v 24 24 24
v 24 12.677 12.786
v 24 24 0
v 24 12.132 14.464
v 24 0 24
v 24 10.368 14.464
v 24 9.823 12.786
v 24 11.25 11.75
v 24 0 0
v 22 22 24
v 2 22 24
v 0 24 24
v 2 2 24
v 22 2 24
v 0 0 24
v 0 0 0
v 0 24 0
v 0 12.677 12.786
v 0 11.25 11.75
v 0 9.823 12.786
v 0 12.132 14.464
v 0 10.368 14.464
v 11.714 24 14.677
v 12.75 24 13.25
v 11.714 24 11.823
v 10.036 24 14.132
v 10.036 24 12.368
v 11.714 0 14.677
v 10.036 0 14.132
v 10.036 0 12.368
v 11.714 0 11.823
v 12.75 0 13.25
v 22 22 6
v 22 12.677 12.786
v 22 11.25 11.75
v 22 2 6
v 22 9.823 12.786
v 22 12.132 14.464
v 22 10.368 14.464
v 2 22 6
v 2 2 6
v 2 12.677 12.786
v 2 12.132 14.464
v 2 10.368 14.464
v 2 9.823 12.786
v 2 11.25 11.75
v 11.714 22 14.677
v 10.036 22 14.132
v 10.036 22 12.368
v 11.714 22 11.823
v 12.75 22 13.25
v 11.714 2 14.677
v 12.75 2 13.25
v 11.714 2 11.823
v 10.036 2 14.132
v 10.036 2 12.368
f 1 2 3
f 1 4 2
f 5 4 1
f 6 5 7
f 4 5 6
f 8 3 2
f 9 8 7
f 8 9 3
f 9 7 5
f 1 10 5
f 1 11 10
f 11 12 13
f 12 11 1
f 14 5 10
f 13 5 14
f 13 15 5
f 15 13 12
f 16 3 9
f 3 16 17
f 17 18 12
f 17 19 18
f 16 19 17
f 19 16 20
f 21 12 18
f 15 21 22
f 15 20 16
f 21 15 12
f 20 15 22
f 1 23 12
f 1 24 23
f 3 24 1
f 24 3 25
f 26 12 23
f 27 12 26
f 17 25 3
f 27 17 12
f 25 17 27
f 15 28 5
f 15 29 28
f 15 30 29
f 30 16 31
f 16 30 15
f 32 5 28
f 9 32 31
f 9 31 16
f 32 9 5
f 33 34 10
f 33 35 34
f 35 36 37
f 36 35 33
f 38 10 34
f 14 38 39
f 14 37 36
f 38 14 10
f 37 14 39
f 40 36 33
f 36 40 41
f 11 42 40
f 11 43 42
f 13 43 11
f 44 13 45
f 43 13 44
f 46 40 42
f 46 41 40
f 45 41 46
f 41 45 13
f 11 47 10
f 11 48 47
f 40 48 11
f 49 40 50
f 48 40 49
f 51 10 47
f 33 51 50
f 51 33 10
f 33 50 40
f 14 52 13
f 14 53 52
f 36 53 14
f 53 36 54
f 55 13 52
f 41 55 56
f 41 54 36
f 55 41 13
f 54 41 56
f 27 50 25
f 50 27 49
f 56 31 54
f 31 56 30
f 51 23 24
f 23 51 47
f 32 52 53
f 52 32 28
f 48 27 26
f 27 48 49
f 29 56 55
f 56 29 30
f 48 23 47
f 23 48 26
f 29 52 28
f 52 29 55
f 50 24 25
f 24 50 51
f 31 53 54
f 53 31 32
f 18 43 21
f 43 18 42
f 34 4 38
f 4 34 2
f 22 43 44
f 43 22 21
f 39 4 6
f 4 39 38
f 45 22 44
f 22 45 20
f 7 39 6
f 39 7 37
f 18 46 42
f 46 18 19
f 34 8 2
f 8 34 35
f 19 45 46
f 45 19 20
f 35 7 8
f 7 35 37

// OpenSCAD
// A square endcap.
// Created for the Lehi Roller CNC Mill project
// https://github.com/bendetat/lehi-roller


endcap(20, 2, 3);

module endcap(intSize, wallThickness, holeDiameter) {
	holeRadius = holeDiameter / 2;
	extSize = intSize + wallThickness * 2;
	holeTranslation = extSize / 2 - holeRadius / 2;
	
	difference() {
		cube([extSize, extSize, extSize]);
		
		translate([wallThickness, wallThickness, wallThickness * 3]) {
			cube([intSize, intSize, intSize]);
		}

		// punch holes #1
		translate([holeTranslation, extSize + 5, holeTranslation + wallThickness]) {
			rotate([90,0,0]) {			
				cylinder(h=extSize+10, r=holeRadius);
			}
		}

		// punch holes #2
		translate([-holeTranslation/2 , holeTranslation, holeTranslation + wallThickness]) {
			rotate([0,90,0]) {			
				cylinder(h=extSize+10, r=holeRadius);
			}
		}
	}

}
